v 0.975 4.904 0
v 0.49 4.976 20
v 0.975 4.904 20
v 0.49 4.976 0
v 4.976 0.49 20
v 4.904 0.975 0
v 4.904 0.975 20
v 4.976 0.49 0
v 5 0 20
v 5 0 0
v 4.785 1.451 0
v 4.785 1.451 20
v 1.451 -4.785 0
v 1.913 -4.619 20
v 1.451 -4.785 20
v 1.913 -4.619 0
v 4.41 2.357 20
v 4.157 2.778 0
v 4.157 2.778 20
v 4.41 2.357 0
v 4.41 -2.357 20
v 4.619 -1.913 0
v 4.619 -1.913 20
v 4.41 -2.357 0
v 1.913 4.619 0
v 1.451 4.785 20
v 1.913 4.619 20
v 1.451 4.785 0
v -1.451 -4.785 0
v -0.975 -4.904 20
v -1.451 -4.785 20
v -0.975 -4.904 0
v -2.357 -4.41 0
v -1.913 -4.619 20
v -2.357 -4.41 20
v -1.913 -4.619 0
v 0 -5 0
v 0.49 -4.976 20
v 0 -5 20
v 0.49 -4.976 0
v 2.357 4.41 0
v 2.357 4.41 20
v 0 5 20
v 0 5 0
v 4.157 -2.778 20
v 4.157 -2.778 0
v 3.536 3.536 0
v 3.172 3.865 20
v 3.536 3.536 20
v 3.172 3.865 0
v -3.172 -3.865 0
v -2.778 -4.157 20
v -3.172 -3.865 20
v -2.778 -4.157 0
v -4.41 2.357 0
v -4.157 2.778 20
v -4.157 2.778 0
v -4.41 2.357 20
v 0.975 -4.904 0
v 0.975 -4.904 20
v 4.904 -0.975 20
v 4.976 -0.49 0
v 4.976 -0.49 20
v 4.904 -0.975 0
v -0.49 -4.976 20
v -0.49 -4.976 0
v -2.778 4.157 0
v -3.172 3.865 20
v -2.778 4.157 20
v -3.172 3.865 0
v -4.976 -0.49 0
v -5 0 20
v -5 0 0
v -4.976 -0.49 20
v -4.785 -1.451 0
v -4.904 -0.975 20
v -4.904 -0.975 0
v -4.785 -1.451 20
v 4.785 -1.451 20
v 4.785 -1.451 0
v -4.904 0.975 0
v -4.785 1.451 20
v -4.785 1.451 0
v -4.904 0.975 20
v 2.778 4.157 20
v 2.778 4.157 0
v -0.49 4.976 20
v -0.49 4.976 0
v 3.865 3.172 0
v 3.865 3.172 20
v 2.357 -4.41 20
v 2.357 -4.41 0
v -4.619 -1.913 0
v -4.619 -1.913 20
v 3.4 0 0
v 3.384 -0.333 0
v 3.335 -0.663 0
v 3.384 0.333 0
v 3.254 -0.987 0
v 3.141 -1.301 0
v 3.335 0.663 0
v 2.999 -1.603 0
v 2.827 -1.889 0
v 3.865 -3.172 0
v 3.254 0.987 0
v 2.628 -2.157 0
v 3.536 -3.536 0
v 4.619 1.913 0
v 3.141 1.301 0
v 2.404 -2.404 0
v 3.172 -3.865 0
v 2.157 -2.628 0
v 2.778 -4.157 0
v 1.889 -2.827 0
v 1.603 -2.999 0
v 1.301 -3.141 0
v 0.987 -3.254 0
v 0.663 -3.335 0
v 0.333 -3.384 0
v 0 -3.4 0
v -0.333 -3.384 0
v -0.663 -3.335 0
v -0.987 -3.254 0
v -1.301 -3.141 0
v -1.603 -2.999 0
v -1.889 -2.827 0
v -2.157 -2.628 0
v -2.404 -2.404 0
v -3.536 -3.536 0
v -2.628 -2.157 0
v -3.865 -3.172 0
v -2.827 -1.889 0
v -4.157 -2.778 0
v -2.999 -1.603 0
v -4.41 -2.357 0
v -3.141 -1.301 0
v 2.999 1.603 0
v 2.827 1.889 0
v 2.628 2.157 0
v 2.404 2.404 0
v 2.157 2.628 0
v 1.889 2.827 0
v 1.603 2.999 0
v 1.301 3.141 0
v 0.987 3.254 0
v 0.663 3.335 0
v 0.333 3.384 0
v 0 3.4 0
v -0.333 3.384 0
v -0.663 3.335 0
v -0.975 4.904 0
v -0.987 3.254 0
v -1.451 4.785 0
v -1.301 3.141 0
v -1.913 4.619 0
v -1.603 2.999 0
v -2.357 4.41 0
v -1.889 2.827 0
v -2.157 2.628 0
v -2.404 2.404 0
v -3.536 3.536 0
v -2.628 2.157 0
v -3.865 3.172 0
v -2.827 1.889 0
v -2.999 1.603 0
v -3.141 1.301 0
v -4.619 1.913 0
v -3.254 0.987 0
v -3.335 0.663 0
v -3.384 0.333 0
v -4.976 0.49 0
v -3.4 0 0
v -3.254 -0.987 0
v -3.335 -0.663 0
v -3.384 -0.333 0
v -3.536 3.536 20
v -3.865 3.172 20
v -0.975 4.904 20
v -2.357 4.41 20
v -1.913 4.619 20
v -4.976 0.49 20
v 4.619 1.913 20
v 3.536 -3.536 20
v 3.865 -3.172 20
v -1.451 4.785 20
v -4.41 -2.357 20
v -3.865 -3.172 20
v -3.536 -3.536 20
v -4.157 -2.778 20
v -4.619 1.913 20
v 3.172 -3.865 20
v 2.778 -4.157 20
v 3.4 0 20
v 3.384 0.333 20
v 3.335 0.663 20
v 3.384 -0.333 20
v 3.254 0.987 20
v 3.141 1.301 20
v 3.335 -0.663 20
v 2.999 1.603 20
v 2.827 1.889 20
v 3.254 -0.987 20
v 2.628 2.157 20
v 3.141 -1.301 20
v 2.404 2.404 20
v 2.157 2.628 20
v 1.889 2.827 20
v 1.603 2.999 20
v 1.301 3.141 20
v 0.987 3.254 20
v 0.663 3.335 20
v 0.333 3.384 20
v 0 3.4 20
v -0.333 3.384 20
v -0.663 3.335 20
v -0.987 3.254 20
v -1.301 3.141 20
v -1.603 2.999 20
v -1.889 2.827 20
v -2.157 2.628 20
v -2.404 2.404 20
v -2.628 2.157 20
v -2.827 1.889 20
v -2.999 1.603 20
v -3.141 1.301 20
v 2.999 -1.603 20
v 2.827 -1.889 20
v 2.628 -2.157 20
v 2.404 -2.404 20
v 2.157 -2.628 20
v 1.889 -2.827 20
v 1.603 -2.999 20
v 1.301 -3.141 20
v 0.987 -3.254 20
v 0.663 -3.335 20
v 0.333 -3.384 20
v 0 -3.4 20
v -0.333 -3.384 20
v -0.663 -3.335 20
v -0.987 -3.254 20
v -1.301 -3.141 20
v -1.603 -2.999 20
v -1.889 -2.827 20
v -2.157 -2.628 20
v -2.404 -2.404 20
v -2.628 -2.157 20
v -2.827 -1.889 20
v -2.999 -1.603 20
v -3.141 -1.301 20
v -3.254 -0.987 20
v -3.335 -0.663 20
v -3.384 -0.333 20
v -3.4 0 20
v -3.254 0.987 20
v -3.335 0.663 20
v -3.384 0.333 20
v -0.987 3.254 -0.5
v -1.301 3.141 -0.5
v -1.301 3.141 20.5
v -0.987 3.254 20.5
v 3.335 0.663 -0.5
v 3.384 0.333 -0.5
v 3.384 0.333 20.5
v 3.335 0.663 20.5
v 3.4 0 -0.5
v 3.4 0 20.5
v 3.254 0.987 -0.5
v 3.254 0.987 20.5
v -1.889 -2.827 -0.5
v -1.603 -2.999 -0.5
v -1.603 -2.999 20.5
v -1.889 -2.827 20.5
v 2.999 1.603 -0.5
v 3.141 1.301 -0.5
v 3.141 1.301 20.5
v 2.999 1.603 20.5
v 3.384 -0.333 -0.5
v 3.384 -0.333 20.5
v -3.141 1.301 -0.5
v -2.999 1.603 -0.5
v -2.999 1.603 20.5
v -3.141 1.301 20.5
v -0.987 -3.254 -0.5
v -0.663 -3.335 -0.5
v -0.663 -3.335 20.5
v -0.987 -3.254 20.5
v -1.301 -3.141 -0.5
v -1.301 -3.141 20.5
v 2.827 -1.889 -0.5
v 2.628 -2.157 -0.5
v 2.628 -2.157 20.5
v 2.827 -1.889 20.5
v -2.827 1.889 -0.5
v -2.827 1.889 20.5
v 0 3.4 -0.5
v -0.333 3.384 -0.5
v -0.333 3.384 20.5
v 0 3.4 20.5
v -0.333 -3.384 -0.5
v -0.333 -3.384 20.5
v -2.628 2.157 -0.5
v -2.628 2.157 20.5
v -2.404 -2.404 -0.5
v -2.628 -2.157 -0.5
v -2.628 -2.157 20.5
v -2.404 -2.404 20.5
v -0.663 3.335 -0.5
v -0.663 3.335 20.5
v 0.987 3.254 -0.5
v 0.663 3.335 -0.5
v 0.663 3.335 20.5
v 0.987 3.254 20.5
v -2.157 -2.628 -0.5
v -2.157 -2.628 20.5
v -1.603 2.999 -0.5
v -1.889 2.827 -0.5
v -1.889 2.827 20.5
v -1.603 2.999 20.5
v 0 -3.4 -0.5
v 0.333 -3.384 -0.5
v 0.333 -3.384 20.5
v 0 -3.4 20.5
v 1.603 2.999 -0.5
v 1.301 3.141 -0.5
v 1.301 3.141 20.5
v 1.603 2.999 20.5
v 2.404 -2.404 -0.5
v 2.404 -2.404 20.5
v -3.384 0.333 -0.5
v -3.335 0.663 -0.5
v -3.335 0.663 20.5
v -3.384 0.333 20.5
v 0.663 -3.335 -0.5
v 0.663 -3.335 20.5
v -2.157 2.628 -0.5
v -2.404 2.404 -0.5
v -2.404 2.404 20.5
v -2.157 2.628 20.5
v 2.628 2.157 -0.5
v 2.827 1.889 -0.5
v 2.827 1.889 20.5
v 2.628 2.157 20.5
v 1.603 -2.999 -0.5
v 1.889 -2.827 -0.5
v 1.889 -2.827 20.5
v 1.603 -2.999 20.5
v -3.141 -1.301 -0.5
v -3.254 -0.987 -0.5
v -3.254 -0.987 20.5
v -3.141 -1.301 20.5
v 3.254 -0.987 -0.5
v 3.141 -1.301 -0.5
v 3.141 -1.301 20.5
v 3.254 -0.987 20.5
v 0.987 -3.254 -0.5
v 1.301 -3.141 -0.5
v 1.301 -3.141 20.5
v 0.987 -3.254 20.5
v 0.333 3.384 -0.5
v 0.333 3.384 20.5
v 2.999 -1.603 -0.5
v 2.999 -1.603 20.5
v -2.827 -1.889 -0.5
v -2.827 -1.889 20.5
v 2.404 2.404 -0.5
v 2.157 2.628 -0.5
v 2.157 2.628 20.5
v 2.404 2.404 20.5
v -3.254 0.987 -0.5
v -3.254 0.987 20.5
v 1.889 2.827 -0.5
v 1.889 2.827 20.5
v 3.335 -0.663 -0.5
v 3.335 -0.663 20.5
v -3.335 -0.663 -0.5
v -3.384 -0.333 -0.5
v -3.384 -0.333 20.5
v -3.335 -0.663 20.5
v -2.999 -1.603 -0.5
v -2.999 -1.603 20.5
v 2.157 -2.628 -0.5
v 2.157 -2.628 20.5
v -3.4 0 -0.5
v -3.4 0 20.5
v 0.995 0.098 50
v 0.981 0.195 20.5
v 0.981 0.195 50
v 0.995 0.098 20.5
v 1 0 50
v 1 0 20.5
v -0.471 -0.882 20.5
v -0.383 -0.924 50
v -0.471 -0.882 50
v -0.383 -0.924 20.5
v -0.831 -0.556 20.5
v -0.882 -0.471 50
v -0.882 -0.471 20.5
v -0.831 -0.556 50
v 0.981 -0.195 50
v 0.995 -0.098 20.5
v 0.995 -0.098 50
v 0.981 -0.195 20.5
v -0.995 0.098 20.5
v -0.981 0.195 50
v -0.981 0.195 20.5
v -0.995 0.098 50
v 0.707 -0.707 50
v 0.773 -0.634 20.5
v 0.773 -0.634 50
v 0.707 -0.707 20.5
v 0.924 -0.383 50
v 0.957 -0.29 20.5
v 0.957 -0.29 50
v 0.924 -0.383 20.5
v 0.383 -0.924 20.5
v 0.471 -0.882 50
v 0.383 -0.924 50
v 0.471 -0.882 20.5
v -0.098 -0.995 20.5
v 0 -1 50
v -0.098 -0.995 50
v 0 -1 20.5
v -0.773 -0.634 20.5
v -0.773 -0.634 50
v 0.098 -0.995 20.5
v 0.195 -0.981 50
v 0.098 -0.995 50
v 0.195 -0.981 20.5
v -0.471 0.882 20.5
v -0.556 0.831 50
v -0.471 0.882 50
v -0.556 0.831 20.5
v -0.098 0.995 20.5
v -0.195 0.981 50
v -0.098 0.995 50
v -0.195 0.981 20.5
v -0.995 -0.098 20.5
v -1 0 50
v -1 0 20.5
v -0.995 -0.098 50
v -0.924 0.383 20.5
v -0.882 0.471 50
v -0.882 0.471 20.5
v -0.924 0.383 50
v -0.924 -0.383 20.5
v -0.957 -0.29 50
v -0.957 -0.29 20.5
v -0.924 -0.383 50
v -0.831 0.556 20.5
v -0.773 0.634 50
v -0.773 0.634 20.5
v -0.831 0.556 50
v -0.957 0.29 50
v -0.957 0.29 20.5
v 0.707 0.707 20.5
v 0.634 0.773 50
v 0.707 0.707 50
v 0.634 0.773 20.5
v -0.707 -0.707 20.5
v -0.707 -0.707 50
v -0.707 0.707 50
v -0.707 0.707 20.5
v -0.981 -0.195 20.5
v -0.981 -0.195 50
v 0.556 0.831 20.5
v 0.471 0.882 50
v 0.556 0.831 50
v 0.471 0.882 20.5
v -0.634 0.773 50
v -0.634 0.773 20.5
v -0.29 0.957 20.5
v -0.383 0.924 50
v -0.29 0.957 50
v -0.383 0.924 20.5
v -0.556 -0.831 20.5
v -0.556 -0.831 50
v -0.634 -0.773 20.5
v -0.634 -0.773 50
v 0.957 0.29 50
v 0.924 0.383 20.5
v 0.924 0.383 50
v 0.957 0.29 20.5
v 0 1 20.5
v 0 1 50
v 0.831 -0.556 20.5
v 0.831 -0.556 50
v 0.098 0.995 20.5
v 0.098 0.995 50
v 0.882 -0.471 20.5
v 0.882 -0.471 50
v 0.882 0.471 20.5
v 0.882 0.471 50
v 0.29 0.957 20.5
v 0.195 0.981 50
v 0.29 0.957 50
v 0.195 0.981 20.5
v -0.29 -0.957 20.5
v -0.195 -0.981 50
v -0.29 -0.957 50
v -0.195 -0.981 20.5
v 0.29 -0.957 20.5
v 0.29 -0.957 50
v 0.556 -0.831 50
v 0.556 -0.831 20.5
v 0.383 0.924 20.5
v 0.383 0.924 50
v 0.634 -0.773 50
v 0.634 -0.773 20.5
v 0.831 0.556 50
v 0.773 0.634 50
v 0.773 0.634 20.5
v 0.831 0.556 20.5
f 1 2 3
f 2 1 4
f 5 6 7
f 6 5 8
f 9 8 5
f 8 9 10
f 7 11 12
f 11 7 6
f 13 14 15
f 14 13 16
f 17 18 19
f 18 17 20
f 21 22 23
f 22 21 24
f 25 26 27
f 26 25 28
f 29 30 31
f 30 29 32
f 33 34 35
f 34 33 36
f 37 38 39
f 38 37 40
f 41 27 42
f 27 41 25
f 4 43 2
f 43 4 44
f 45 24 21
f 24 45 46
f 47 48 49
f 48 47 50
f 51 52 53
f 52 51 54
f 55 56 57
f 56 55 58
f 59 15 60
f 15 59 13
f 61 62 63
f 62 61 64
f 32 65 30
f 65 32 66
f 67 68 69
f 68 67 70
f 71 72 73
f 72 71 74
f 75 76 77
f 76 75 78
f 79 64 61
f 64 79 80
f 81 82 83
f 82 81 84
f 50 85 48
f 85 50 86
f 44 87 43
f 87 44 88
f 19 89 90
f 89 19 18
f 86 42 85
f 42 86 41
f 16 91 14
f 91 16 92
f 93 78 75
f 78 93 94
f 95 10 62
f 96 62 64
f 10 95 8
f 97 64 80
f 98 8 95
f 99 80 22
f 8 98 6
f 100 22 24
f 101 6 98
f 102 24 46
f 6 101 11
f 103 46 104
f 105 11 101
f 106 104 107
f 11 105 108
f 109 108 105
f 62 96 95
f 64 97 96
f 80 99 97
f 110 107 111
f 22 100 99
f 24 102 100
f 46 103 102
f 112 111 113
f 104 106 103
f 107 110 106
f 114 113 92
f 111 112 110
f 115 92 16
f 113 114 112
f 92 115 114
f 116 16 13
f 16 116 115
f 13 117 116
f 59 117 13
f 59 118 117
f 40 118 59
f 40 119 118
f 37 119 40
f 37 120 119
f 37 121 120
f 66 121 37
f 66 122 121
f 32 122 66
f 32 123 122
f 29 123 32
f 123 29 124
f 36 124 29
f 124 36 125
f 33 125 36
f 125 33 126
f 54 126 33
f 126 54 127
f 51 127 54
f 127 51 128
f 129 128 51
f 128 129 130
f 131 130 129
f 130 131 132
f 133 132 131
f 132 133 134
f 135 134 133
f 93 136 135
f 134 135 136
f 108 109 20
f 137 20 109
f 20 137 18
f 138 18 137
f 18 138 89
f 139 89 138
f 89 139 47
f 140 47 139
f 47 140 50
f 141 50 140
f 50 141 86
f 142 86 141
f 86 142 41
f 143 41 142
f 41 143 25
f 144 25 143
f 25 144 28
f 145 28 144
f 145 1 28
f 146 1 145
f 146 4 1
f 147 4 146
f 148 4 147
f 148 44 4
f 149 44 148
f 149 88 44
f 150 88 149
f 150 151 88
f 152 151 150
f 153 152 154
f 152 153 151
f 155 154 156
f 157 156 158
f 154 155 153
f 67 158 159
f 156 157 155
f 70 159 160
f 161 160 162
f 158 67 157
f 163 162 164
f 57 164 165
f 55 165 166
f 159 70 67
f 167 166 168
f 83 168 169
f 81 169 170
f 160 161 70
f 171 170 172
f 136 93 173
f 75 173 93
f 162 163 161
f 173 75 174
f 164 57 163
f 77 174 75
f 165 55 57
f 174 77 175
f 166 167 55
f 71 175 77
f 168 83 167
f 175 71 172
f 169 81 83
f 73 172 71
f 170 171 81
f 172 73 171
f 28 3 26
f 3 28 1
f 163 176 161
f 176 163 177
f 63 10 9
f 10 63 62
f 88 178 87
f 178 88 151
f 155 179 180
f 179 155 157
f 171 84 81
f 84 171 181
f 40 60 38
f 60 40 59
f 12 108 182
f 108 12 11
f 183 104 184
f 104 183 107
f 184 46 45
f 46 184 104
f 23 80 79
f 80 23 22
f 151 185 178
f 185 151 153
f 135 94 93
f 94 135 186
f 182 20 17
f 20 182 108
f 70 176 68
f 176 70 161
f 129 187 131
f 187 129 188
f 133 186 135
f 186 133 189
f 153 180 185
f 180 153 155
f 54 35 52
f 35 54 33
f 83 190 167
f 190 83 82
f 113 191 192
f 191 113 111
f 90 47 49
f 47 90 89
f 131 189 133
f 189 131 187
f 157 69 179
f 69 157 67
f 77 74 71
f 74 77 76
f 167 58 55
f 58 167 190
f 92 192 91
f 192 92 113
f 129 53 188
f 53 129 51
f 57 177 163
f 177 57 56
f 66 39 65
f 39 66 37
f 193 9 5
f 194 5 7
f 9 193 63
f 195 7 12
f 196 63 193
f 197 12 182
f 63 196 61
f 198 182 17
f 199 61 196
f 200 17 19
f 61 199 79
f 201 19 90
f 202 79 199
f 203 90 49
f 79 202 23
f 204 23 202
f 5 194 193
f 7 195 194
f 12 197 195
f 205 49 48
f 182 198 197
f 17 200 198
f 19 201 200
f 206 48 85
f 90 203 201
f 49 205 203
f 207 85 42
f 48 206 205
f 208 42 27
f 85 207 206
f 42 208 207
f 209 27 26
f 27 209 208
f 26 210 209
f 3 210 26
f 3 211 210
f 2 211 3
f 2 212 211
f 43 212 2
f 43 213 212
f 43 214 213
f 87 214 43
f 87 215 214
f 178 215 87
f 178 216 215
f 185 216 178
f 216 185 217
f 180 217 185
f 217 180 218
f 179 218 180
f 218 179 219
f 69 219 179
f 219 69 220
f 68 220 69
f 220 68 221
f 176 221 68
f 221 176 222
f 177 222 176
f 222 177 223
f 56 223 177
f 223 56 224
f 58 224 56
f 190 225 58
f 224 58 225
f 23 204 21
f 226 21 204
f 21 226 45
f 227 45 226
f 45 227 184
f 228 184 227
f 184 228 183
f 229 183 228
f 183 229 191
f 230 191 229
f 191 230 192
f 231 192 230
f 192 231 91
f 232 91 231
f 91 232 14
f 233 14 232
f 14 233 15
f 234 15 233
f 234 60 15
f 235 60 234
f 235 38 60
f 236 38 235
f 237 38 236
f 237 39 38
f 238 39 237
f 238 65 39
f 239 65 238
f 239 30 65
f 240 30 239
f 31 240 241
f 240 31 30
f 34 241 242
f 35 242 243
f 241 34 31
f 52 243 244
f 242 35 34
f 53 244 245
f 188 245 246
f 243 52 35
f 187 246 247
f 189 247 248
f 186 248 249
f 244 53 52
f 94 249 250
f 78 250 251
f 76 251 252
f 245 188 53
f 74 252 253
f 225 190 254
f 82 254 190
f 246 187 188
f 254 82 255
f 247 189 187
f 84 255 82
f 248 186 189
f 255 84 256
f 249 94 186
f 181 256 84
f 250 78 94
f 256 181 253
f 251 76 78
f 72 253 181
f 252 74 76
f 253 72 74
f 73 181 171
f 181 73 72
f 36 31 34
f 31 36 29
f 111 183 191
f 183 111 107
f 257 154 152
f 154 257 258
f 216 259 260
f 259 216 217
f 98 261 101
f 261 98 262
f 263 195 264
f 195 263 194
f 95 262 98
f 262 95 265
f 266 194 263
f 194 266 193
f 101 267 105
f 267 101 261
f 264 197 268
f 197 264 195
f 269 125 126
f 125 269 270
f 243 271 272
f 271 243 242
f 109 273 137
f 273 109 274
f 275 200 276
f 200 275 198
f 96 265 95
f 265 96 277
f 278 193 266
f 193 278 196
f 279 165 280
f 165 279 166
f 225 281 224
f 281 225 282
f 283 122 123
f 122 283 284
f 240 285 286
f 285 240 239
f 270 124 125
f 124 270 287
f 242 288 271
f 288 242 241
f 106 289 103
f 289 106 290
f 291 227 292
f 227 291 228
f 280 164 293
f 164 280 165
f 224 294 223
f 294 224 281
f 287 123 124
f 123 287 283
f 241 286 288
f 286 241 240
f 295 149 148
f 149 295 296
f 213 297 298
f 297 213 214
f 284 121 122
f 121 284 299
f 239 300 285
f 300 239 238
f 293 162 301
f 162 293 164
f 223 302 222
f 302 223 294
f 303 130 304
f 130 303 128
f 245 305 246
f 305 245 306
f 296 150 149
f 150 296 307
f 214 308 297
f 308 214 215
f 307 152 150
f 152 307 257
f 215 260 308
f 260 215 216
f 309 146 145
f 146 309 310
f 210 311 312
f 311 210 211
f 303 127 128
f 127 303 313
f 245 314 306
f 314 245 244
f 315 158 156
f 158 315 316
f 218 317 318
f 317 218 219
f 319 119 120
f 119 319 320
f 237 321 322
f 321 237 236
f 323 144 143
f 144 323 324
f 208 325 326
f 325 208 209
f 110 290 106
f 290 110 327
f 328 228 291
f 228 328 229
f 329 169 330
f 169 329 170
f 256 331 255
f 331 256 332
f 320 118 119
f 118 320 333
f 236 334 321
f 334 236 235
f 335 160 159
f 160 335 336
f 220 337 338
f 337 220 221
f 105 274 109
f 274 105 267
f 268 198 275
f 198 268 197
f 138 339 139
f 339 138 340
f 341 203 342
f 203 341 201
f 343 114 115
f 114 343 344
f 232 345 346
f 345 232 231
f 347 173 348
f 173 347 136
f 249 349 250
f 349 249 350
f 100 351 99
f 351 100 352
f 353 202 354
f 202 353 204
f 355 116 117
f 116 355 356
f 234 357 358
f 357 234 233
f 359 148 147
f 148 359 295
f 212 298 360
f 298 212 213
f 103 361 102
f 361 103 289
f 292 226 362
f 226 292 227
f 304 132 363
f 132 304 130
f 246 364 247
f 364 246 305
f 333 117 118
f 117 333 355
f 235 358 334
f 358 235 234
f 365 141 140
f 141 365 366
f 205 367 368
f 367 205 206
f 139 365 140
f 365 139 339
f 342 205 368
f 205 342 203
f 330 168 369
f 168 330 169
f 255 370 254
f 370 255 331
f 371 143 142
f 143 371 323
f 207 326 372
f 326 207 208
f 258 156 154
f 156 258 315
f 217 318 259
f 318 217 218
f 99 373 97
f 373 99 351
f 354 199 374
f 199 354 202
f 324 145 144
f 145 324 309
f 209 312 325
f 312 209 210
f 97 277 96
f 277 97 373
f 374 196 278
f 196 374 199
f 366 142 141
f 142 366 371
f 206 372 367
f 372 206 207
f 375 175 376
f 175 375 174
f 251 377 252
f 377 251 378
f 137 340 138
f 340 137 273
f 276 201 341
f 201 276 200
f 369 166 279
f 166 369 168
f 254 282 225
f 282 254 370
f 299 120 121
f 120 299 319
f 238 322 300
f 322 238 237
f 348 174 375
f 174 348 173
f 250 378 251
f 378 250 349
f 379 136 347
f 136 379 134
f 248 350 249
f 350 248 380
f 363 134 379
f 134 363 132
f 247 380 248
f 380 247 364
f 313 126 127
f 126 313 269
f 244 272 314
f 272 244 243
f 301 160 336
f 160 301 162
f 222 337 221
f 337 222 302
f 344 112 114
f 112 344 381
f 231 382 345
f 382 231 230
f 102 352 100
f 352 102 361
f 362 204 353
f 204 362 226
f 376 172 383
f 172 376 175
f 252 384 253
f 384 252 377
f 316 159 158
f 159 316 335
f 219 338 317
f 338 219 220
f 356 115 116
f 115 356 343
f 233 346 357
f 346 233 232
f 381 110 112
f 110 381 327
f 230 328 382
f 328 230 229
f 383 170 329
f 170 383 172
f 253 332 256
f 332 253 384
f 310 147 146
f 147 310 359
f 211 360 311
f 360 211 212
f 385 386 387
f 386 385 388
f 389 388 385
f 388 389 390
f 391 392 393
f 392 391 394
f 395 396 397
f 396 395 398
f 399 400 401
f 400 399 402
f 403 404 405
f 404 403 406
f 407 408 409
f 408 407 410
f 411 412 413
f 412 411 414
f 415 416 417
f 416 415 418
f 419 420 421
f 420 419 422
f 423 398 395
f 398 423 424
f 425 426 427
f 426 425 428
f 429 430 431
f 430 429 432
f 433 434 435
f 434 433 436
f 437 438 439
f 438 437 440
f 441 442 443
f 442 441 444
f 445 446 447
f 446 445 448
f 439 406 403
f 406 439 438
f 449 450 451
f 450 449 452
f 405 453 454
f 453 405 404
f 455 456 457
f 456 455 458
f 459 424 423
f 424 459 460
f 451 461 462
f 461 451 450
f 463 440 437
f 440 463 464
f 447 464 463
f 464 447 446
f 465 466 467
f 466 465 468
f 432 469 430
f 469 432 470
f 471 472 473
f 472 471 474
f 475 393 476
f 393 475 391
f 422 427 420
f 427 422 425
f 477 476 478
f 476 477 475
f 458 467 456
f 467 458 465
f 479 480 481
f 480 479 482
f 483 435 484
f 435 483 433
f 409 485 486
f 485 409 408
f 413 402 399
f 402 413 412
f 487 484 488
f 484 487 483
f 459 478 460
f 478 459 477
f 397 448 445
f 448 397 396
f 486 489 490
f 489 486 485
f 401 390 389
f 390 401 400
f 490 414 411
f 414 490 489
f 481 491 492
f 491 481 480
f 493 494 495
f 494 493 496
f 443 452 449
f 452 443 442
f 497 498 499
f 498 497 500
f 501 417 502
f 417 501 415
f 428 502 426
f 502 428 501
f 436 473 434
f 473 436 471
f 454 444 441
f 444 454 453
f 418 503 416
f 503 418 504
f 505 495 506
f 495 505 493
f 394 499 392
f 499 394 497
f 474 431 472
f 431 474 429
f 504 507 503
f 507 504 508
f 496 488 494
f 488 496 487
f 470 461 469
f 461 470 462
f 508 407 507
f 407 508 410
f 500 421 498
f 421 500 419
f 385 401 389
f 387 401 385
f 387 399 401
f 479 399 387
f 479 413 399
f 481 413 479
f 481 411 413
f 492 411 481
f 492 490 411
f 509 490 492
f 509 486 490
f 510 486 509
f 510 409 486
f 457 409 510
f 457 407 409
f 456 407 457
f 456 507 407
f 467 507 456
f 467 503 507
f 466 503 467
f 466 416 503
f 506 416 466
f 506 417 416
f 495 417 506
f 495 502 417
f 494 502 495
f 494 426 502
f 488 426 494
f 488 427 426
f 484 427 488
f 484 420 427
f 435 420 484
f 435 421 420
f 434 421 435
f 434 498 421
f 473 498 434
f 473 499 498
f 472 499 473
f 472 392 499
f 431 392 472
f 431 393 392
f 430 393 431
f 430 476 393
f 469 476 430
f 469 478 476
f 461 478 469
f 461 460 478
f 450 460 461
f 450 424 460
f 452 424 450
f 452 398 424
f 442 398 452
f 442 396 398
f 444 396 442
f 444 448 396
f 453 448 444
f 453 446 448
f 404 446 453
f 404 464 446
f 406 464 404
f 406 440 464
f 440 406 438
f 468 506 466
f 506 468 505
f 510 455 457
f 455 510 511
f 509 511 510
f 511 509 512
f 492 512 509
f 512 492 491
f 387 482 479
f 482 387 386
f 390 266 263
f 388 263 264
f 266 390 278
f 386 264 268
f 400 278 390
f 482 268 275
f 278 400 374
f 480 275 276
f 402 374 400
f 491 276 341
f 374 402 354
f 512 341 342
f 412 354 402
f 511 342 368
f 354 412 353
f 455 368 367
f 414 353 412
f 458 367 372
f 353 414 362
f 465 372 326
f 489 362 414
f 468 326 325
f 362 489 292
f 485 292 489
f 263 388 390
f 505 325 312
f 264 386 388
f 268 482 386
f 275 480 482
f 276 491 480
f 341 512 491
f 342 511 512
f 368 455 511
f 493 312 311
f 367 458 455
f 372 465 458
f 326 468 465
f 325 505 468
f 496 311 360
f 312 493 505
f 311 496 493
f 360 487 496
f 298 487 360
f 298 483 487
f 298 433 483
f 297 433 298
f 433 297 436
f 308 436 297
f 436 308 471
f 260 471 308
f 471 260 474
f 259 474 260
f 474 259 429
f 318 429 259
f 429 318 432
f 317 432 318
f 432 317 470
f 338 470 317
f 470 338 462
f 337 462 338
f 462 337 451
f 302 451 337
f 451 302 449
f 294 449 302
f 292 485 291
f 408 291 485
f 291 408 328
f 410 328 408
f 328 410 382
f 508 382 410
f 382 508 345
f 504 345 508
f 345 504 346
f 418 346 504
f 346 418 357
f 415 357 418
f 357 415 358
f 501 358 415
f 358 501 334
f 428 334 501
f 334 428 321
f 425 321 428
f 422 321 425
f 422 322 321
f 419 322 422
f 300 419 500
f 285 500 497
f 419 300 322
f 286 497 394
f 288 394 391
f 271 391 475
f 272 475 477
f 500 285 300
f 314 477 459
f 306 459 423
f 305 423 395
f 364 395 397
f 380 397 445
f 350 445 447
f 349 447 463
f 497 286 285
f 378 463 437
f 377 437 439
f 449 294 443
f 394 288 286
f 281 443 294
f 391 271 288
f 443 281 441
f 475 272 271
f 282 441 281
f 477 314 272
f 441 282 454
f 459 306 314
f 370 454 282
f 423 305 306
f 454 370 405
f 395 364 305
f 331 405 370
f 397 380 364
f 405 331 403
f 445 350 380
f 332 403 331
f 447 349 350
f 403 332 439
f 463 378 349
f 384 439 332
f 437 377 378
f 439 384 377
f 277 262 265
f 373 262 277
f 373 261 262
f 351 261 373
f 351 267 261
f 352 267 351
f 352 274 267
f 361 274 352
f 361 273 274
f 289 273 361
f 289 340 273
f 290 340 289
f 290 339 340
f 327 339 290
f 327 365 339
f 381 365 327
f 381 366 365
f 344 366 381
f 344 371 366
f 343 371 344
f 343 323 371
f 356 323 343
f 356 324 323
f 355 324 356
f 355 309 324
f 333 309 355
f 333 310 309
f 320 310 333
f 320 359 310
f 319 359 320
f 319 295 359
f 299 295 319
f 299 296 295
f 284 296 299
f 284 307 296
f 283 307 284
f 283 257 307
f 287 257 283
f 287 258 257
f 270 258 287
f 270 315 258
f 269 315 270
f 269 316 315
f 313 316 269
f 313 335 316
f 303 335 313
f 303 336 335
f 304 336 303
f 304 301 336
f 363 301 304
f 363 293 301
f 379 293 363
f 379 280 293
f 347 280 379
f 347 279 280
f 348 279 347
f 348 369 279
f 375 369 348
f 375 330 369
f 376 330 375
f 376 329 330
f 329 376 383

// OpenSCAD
// Funnel with spout - printed upright, wide opening at top
// Units: mm. Wall thickness 1.6 mm throughout.

// ---------- Parameters ----------
spout_od      = 10;    // spout outer diameter
spout_length  = 20;    // spout runs from z = 0 to z = 20
cone_top_d    = 10;    // cone outer diameter at z = 20 (spout top)
cone_rim_d    = 60;    // cone outer diameter at rim (z = 50)
rim_z         = 50;    // rim height
wall          = 1.6;   // wall thickness
cut_extra     = 0.5;   // overshoot for clean boolean cuts

$fn = 64;

// ---------- Derived ----------
spout_id = spout_od - 2 * wall;   // bore = 6.8 mm
cone_h   = rim_z - spout_length;  // cone height = 30 mm

// ---------- Model ----------
union() {
    // Spout (tube)
    difference() {
        cylinder(d = spout_od, h = spout_length);
        translate([0, 0, -cut_extra])
            cylinder(d = spout_id, h = spout_length + 2 * cut_extra);
    }

    // Cone, joined at z = 20
    translate([0, 0, spout_length])
        linear_extrude(height = cone_h)
            circle(d1 = cone_top_d, d2 = cone_rim_d);

    // Bottom outlet: bore through the spout end at z = 0
    translate([0, 0, -cut_extra])
        cylinder(d = spout_id, h = spout_length + 2 * cut_extra);
}
